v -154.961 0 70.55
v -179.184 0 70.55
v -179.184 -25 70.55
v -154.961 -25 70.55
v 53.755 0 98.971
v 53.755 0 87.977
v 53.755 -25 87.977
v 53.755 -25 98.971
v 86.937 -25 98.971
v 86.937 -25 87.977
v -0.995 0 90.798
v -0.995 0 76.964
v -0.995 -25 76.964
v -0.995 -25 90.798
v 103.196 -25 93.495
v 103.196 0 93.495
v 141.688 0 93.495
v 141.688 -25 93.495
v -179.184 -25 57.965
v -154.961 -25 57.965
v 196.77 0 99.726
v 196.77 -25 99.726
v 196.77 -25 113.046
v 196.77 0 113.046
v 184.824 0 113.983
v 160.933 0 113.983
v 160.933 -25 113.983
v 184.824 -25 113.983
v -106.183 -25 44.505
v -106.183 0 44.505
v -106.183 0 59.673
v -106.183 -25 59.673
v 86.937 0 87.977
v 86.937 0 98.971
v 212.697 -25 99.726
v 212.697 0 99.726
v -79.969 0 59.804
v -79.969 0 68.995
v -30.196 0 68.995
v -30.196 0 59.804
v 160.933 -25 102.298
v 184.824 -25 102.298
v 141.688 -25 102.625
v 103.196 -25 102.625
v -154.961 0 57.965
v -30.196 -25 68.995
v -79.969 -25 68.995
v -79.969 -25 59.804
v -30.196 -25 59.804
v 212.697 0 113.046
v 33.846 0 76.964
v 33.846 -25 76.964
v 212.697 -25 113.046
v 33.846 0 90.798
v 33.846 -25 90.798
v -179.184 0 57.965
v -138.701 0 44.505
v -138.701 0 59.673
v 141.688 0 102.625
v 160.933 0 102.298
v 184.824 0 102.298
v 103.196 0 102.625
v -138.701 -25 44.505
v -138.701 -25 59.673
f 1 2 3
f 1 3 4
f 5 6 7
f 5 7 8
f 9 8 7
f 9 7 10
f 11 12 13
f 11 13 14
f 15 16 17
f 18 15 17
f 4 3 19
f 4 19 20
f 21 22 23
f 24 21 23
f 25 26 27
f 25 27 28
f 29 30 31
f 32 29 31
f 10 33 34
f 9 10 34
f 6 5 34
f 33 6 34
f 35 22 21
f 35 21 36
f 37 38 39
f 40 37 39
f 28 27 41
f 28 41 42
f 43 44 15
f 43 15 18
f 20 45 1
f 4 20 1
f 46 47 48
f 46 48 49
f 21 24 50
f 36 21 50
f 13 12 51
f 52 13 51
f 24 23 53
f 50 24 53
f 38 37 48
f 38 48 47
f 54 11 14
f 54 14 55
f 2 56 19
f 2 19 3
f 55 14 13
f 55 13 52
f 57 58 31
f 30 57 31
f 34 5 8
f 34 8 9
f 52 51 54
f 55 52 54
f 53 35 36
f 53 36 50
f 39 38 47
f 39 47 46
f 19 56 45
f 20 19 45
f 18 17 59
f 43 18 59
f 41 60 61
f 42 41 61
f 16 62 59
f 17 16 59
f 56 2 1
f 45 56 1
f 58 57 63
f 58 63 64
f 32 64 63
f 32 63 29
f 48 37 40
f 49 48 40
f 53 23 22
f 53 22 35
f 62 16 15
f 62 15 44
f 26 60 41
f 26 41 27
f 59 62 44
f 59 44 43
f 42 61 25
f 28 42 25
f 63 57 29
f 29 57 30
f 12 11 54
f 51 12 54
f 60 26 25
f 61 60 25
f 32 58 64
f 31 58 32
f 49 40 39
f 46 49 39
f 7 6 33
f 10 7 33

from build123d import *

# Parameters (mm, degrees)
F0_W     = 24.222955
F0_H     = 12.584899
F0_W_2   = 32.518492
F0_H_2   = 15.1675
F0_W_3   = 49.773205
F0_H_3   = 9.191025
F0_W_4   = 34.841244
F0_H_4   = 13.833336
F0_W_5   = 33.182137
F0_H_5   = 10.994062
F0_W_6   = 38.491286
F0_H_6   = 9.129628
F0_W_7   = 23.891137
F0_H_7   = 11.685223
F0_W_8   = 15.927419
F0_H_8   = 13.320498
F1_DEPTH = 25


with BuildPart() as f1:
    # F0 (on Front) → F1 (new body)
    with BuildSketch(Plane.XZ):
        with Locations((-167.072066, 64.257895)):
            Rectangle(F0_W, F0_H)
        with Locations((-122.442089, 52.088948)):
            Rectangle(F0_W_2, F0_H_2)
        with Locations((-55.082349, 64.399867)):
            Rectangle(F0_W_3, F0_H_3)
        with Locations((16.425157, 83.880935)):
            Rectangle(F0_W_4, F0_H_4)
        with Locations((70.346128, 93.473785)):
            Rectangle(F0_W_5, F0_H_5)
        with Locations((122.442093, 98.060228)):
            Rectangle(F0_W_6, F0_H_6)
        with Locations((172.878928, 108.140498)):
            Rectangle(F0_W_7, F0_H_7)
        with Locations((204.733781, 106.386099)):
            Rectangle(F0_W_8, F0_H_8)
    extrude(amount=F1_DEPTH)


solid = f1.part
